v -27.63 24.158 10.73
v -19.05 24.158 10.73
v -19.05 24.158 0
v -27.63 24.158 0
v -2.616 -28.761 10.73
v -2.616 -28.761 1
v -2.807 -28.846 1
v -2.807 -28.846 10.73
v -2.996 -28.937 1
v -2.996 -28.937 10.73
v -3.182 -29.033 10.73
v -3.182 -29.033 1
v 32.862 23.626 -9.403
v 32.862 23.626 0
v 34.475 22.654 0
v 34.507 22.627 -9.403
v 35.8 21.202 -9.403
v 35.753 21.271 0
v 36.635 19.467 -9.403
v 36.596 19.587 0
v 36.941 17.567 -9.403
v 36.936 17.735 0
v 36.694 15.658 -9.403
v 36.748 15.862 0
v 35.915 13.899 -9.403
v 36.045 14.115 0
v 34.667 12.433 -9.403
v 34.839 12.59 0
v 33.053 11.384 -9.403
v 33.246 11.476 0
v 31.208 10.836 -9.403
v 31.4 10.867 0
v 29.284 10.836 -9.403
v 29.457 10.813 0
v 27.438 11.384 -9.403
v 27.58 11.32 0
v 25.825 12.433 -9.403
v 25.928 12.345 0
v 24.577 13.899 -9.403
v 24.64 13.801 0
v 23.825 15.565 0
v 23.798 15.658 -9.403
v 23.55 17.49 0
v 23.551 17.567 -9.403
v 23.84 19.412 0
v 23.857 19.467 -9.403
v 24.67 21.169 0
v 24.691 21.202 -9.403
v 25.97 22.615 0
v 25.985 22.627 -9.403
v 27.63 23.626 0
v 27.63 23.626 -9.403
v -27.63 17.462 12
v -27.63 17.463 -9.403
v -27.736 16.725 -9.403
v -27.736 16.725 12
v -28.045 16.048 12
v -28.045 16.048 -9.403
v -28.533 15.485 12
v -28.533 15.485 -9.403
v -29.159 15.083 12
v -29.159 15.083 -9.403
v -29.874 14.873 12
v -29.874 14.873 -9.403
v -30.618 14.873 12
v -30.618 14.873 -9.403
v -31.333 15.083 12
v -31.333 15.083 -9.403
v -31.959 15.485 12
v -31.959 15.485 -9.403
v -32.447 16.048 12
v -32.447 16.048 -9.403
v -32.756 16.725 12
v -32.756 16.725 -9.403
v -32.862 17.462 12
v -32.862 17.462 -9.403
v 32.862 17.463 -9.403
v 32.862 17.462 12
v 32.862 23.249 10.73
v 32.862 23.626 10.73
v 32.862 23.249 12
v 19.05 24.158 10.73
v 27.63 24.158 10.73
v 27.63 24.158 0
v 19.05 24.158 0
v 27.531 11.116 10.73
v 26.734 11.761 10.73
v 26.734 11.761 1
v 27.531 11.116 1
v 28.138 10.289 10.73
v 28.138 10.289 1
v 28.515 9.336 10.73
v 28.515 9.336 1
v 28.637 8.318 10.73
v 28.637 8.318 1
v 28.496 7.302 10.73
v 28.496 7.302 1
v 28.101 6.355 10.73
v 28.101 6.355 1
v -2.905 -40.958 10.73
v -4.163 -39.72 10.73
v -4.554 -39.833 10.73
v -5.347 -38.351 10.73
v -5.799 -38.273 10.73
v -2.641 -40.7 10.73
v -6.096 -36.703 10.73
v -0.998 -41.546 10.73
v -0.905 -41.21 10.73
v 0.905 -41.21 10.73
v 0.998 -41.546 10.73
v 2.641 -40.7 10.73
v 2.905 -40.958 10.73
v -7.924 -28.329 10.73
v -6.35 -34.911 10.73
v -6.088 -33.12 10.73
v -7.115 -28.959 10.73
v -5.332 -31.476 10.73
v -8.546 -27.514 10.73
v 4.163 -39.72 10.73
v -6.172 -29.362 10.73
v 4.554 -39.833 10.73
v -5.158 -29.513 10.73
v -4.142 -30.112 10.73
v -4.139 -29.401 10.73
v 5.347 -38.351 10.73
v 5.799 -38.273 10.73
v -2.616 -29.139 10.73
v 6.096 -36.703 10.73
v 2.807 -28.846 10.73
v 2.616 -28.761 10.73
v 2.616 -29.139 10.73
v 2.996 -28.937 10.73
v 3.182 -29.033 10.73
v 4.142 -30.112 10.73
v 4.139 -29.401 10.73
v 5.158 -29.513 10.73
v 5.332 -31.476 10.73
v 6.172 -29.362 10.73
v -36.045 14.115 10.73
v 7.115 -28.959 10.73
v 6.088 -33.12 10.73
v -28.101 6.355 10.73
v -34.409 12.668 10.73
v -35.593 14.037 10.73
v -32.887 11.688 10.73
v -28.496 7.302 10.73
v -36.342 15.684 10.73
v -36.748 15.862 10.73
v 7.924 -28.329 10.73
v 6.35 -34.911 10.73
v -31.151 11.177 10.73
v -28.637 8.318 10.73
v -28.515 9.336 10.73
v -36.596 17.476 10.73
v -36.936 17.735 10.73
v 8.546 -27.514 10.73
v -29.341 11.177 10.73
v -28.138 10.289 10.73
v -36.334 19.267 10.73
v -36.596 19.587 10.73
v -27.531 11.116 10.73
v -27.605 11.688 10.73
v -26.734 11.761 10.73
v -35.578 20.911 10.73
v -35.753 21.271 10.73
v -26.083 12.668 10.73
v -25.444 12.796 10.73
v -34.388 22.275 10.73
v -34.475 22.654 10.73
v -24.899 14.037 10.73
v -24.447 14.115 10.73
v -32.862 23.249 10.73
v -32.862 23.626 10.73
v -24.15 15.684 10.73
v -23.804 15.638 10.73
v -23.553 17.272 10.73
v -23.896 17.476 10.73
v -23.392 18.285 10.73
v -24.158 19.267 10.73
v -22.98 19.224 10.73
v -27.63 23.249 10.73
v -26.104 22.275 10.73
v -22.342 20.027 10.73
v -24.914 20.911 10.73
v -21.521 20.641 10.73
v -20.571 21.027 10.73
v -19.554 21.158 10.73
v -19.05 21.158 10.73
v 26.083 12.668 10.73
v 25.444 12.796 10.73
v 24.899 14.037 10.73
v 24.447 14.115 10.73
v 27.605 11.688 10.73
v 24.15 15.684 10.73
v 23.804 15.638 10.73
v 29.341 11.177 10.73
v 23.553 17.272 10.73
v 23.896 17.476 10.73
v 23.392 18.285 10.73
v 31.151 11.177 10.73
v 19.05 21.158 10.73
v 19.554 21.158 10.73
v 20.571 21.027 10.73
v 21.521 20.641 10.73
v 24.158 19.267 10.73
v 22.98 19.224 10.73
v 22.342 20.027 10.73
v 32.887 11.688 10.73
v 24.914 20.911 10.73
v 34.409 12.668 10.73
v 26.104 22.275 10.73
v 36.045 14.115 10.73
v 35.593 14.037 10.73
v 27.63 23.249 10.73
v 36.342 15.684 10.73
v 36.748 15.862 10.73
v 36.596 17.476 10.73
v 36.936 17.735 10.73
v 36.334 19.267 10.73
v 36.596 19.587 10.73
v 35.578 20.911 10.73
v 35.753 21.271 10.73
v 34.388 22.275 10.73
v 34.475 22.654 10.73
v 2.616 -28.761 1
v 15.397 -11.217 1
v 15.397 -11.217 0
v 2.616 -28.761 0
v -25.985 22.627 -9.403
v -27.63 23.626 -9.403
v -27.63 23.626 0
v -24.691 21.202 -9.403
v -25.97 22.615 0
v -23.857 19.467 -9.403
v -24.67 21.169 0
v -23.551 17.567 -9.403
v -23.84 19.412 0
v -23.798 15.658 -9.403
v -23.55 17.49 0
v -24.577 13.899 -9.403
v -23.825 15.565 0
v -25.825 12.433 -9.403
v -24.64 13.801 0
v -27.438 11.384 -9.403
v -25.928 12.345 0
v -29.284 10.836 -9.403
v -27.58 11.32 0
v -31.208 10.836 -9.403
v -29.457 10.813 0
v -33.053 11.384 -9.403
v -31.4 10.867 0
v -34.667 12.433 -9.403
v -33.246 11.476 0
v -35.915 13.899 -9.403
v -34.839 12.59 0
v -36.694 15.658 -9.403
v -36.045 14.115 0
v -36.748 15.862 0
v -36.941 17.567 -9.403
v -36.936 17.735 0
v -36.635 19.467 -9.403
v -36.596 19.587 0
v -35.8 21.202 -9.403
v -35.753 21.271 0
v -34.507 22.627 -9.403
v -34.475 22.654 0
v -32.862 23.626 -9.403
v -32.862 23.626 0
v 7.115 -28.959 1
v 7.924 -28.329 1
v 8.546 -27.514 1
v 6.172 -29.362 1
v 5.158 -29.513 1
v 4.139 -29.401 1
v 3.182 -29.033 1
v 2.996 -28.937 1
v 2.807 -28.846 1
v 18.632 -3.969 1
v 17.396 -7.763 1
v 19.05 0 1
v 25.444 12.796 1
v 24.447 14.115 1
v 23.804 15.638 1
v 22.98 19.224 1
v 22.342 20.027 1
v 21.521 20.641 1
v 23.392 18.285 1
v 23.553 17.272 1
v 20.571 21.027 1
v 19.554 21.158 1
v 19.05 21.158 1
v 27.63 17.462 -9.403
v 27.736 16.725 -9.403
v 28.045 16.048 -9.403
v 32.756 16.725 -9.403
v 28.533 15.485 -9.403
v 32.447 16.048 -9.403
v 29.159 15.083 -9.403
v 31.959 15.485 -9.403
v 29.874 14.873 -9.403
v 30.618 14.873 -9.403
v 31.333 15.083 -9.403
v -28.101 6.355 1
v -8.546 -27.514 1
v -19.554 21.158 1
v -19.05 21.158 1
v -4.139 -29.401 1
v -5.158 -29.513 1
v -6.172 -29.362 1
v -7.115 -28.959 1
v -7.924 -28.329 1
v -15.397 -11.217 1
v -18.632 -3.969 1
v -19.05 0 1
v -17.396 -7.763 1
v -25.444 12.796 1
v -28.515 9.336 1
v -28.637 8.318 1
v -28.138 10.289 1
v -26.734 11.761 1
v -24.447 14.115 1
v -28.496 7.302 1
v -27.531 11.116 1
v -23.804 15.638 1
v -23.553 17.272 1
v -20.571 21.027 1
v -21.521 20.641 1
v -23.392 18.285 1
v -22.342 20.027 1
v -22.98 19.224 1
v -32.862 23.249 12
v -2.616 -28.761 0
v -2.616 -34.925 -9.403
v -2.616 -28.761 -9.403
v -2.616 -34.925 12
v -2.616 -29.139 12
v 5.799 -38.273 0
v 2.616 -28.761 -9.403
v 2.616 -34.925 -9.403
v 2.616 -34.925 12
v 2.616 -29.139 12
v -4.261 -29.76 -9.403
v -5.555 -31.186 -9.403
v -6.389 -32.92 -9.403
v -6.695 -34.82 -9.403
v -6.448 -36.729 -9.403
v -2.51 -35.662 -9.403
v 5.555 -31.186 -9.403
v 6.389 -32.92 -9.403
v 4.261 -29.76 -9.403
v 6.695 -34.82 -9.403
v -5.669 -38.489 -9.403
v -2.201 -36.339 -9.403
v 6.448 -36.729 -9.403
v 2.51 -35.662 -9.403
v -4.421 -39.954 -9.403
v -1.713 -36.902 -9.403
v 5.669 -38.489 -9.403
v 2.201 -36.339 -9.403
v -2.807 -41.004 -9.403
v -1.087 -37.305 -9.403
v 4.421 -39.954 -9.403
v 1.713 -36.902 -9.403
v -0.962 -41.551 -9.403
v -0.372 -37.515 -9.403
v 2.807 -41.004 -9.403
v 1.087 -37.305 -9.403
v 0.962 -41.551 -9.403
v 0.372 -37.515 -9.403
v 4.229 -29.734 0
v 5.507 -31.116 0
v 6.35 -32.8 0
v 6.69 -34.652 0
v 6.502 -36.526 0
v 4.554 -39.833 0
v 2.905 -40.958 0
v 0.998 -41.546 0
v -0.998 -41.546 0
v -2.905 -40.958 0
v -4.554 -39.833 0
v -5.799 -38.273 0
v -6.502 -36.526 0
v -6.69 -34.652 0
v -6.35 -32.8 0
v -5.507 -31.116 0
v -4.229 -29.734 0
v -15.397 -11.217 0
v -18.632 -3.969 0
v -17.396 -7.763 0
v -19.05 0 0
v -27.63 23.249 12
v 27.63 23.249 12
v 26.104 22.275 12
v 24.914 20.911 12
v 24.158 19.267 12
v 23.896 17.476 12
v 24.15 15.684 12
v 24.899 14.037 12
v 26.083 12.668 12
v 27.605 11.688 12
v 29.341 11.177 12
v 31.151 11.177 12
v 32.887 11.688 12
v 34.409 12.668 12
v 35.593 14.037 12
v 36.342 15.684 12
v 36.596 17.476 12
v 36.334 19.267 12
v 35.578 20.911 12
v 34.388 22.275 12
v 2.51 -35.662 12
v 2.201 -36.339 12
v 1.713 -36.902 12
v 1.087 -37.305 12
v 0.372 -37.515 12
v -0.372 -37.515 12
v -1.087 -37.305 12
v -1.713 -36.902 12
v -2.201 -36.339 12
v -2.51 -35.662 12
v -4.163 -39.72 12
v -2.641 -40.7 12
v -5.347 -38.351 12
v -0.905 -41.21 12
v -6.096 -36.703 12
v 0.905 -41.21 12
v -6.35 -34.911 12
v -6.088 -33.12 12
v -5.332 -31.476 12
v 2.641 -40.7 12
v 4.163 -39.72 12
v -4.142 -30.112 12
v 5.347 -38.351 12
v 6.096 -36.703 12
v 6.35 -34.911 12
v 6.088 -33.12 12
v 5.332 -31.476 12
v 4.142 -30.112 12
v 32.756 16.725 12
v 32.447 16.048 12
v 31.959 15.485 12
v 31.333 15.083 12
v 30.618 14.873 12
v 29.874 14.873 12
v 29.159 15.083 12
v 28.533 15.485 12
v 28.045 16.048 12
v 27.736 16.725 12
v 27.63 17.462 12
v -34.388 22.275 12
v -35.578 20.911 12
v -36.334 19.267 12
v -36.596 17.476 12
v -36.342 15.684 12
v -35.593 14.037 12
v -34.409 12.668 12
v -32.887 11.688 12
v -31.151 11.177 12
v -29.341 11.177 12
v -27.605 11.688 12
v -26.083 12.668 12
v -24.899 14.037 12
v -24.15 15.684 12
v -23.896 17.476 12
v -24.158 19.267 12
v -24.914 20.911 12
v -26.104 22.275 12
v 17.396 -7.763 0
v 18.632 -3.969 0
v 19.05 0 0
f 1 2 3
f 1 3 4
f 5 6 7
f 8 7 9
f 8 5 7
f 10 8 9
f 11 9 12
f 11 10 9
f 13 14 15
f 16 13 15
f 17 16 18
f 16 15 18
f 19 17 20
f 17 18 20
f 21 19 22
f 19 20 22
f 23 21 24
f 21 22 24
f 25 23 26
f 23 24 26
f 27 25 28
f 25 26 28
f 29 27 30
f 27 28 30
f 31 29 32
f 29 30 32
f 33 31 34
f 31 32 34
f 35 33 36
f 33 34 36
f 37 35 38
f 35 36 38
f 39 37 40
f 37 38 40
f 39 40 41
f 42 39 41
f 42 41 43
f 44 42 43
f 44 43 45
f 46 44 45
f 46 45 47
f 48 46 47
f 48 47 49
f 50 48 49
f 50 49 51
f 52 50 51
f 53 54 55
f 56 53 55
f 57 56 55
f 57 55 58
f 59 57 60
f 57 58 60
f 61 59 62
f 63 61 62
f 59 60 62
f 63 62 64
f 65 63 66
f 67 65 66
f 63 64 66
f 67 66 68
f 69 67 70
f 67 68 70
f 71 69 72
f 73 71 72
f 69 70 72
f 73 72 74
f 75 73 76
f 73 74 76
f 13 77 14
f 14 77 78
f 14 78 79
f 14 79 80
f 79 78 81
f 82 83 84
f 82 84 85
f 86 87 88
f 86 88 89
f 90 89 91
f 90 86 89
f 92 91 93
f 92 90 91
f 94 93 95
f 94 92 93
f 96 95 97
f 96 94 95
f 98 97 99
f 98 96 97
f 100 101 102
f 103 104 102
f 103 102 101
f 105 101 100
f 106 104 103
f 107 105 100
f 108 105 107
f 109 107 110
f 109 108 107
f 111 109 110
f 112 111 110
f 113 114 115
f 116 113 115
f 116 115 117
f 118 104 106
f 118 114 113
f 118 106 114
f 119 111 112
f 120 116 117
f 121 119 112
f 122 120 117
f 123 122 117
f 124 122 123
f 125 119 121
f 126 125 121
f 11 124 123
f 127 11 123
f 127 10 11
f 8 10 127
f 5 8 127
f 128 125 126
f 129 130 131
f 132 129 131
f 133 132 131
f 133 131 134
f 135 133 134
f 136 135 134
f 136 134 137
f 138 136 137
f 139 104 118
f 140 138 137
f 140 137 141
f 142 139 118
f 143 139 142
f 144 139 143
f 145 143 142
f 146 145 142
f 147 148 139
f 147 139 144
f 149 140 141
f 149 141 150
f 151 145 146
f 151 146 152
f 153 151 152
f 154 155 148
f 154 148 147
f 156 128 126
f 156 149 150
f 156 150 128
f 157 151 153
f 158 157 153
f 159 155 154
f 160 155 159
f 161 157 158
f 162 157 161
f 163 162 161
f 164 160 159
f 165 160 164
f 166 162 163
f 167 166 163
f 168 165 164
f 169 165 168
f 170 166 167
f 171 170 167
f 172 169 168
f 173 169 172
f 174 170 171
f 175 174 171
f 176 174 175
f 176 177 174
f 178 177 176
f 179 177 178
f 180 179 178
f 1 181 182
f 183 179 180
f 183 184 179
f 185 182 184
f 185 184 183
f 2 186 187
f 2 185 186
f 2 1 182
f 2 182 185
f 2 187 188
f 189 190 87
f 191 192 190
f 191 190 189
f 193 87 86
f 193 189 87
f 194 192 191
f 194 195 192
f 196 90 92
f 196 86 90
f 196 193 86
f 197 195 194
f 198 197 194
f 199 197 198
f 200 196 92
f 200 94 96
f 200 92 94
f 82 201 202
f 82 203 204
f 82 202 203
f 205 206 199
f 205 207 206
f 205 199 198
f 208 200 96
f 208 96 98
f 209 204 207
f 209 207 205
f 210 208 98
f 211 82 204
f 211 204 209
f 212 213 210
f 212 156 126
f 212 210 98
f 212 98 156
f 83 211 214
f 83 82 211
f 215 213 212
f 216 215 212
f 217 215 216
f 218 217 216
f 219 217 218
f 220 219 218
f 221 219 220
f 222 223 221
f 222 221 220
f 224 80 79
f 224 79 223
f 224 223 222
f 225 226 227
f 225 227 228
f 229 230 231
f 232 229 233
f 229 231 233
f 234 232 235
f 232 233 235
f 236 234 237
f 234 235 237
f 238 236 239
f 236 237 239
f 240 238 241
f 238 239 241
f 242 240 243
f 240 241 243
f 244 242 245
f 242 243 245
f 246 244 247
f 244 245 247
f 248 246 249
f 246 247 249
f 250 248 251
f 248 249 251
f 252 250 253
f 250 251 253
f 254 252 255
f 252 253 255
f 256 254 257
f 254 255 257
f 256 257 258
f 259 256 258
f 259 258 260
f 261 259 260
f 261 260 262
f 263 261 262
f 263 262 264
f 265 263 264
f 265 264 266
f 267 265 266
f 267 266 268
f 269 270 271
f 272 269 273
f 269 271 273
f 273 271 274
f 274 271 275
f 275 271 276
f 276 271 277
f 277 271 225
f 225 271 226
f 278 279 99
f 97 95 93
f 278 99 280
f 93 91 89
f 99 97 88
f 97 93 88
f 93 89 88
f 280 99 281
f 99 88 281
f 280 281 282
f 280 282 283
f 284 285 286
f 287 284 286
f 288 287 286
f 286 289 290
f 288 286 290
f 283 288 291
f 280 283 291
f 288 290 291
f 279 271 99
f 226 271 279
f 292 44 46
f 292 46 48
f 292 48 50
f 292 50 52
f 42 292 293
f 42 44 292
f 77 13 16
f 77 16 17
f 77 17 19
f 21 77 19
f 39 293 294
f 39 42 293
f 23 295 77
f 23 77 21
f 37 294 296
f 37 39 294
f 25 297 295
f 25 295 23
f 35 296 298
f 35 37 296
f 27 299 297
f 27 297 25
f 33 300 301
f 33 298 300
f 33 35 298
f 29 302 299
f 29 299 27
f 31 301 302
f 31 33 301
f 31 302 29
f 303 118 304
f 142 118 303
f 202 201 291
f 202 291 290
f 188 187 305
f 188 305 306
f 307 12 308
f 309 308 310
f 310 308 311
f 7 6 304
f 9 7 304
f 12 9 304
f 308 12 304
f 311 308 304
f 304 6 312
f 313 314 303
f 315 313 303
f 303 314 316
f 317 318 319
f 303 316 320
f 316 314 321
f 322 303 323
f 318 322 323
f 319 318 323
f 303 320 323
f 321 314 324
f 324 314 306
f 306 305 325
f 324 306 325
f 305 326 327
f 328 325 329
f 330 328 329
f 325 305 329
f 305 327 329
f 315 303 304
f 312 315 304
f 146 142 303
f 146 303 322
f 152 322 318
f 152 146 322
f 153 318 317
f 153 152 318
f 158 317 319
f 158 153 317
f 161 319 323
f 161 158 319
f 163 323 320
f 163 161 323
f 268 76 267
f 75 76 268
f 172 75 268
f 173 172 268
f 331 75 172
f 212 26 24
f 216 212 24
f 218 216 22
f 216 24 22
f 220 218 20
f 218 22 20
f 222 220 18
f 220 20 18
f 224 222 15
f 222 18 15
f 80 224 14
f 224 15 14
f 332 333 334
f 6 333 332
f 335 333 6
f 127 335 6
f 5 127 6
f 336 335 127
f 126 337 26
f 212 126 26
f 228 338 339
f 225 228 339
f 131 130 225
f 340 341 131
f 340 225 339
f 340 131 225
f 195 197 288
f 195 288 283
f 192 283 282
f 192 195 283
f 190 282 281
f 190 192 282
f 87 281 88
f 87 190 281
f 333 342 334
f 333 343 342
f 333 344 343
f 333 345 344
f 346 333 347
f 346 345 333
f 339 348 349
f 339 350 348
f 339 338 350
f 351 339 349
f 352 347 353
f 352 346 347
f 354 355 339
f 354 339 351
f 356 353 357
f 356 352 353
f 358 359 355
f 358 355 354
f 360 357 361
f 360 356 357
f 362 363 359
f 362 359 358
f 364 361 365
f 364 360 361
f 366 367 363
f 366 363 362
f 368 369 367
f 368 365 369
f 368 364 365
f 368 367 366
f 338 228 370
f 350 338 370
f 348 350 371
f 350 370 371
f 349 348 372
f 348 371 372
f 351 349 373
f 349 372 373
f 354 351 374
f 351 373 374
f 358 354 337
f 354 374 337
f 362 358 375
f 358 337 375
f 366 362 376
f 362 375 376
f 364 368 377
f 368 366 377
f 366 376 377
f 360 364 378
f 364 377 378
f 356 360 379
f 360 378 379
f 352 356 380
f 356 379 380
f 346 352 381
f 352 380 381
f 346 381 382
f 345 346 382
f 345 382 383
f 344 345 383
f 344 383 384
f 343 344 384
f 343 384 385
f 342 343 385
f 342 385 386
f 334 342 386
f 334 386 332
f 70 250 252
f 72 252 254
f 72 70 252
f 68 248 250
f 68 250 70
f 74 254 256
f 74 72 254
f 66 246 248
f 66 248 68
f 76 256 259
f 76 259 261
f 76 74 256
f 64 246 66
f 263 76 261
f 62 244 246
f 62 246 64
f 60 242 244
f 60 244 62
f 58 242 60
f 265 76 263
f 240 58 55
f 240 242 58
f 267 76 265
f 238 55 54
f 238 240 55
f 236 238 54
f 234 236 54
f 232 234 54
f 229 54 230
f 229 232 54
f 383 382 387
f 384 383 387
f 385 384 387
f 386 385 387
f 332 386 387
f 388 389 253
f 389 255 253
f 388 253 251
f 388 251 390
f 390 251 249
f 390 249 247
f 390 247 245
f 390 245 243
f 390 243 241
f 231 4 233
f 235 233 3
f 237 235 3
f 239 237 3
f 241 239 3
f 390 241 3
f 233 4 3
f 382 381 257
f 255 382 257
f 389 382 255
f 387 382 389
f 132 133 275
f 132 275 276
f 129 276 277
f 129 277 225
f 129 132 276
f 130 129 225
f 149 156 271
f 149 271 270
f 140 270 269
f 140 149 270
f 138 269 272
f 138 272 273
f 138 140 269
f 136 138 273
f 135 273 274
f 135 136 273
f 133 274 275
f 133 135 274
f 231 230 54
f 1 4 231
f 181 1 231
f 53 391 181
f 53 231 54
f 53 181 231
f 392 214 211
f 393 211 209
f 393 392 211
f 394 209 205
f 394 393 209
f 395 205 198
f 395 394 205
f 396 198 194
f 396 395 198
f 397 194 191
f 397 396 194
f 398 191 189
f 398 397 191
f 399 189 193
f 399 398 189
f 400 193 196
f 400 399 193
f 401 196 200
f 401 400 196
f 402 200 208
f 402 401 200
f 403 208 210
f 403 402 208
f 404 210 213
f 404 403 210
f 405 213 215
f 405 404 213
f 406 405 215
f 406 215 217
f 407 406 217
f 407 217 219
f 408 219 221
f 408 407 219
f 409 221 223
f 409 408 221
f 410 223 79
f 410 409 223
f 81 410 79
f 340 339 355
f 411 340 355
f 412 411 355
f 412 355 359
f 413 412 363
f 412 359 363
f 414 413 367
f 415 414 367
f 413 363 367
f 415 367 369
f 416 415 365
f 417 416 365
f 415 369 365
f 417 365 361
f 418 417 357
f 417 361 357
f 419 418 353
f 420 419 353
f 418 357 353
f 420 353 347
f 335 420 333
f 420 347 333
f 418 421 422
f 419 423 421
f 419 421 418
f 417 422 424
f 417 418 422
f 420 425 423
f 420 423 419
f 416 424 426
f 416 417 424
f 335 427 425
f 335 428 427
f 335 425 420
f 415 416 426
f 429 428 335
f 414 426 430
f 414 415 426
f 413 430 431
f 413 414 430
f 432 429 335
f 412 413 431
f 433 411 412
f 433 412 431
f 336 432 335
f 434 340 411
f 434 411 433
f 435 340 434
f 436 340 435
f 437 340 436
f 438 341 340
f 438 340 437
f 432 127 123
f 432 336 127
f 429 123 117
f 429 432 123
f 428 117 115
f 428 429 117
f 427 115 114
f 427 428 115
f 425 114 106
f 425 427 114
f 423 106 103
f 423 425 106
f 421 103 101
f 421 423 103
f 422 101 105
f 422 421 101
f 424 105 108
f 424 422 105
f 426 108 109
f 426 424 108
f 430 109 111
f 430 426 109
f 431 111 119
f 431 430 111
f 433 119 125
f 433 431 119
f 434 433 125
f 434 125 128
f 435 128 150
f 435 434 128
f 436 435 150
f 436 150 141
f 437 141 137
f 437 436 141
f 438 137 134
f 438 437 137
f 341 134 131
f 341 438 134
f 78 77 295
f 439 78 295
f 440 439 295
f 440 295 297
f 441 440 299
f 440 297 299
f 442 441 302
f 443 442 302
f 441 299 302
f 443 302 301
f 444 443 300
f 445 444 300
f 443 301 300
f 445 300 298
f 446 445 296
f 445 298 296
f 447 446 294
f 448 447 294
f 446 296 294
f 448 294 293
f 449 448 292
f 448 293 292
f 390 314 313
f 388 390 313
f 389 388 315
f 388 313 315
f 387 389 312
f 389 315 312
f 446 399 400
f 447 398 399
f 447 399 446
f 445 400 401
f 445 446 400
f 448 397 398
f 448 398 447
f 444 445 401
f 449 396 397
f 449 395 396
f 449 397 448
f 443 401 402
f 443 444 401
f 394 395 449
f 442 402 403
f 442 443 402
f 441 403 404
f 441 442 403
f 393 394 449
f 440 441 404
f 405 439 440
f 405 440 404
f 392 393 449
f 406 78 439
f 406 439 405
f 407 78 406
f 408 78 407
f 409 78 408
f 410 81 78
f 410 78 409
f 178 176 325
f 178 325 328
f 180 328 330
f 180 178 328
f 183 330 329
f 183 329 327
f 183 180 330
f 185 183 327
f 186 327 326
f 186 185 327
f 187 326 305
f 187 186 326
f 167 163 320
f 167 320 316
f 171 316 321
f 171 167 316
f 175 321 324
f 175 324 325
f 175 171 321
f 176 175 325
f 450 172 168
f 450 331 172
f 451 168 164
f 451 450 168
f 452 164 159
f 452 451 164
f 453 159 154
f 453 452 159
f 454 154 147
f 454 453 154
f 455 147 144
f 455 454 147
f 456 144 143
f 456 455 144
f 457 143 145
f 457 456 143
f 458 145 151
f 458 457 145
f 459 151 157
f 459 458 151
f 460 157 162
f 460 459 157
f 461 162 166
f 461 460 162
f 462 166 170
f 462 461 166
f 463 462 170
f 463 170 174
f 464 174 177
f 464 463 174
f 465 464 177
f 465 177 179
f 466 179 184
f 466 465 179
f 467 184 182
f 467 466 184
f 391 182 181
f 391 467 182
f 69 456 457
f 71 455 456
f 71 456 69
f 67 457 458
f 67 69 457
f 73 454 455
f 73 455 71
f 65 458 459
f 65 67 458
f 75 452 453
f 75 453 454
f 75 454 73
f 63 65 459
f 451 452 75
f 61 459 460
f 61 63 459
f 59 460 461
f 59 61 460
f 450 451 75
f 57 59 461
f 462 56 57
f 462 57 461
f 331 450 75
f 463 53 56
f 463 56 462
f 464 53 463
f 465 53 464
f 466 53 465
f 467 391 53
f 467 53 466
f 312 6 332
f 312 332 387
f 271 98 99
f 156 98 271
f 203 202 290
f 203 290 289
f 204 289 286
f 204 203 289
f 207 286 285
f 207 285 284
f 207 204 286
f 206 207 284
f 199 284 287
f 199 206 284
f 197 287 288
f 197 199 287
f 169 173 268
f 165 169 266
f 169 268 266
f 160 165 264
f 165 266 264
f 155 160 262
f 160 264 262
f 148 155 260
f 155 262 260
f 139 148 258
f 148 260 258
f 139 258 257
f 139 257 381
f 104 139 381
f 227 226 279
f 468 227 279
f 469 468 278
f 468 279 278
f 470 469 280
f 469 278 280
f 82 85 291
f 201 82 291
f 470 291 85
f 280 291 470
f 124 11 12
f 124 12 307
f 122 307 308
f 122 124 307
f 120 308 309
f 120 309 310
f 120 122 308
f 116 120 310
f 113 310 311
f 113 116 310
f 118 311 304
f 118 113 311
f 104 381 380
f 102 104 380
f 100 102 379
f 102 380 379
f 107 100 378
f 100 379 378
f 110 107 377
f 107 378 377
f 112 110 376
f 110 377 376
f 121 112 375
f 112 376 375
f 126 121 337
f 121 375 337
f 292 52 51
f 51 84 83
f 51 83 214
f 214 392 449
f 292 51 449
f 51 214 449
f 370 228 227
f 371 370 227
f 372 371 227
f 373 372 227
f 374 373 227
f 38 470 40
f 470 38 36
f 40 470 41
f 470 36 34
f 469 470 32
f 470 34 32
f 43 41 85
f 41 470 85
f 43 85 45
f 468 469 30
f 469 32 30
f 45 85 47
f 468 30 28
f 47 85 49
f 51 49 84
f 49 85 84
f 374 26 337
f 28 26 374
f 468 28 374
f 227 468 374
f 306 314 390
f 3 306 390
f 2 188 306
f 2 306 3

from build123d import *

# Parameters (mm, degrees)
SKETCH1_R           = 1.5
BOSS_EXTRUDE1_DEPTH = 12
SKETCH2_R           = 6.695859604
BOSS_EXTRUDE2_DEPTH = 9.4028
CUT_EXTRUDE2_DEPTH  = 64.105652153
HOLE1_D             = 5.2324
CUT_EXTRUDE3_DEPTH  = 11
SKETCH8_R           = 19.05
CUT_EXTRUDE4_DEPTH  = 10
SKETCH9_R           = 6.35
CUT_EXTRUDE6_DEPTH  = 1.27
CUT_EXTRUDE7_DEPTH  = 60.624425826


with BuildPart() as part:
    # Sketch1 → Boss-Extrude1 (new body)
    with BuildSketch(Plane.XY):
        Polygon((-40.843506262, 22.426308796), (-1, -46.5846684), (1, -46.5846684), (40.843506262, 22.426308796), (39.843506262, 24.158359604), (-39.843506262, 24.158359604), align=None)
        with Locations((-30.245937227, 17.4625)):
            Circle(SKETCH1_R, mode=Mode.SUBTRACT)
        with Locations((30.245937227, 17.4625)):
            Circle(SKETCH1_R, mode=Mode.SUBTRACT)
        with Locations((0, -34.925)):
            Circle(SKETCH1_R, mode=Mode.SUBTRACT)
    extrude(amount=BOSS_EXTRUDE1_DEPTH)

    # Sketch2 → Boss-Extrude2 (add)
    with BuildSketch(Plane(origin=(0, 0, 0), x_dir=(-1, 0, 0), z_dir=(0, 0, -1))):
        with Locations(Location((30.245937227, 17.4625, 0), (0, 0, 90))):
            Circle(SKETCH2_R)
        with Locations(Location((-30.245937227, 17.4625, 0), (0, 0, 210))):
            Circle(SKETCH2_R)
        with Locations(Location((0, -34.925, 0), (0, 0, 210))):
            Circle(SKETCH2_R)
    extrude(amount=BOSS_EXTRUDE2_DEPTH)

    # Sketch3 → Cut-Extrude2 (cut, through all)
    with BuildSketch(Plane(origin=(0, 0, 0), x_dir=(-1, 0, 0), z_dir=(0, 0, -1))):
        with BuildLine():
            Line((-5.798784517, -38.272929802), (-1, -46.5846684))
            Line((-1, -46.5846684), (1, -46.5846684))
            Line((1, -46.5846684), (5.798784517, -38.272929802))
            ThreePointArc((5.798784517, -38.272929802), (0, -41.620859604), (-5.798784517, -38.272929802))
        make_face()
        with BuildLine():
            Line((-30.245937227, 24.158359604), (-39.843506262, 24.158359604))
            Line((-39.843506262, 24.158359604), (-40.843506262, 22.426308796))
            Line((-40.843506262, 22.426308796), (-36.044721744, 14.114570198))
            ThreePointArc((-36.044721744, 14.114570198), (-36.044721744, 20.810429802), (-30.245937227, 24.158359604))
        make_face()
        with BuildLine():
            Line((36.044721744, 14.114570198), (40.843506262, 22.426308796))
            Line((40.843506262, 22.426308796), (39.843506262, 24.158359604))
            Line((39.843506262, 24.158359604), (30.245937227, 24.158359604))
            ThreePointArc((30.245937227, 24.158359604), (36.044721744, 20.810429802), (36.044721744, 14.114570198))
        make_face()
    extrude(amount=-CUT_EXTRUDE2_DEPTH, mode=Mode.SUBTRACT)

    # Hole1 (through all)
    with Locations(Plane.XY.offset(12)):
        with Locations((-30.245937227, 17.4625), (30.245937227, 17.4625), (0, -34.925)):
            Hole(HOLE1_D / 2)

    # Sketch7 → Cut-Extrude3 (cut)
    with BuildSketch(Plane.XY.offset(12)):
        with BuildLine():
            Line((-19.554402665, 21.158359604), (19.554402665, 21.158359604))
            ThreePointArc((19.554402665, 21.158359604), (22.342326137, 20.026718493), (23.552785201, 17.272100961))
            ThreePointArc((23.552785201, 17.272100961), (24.44715271, 14.114570198), (26.734470809, 11.761259834))
            ThreePointArc((26.734470809, 11.761259834), (28.514810038, 9.335662768), (28.100878252, 6.355429662))
            Line((28.100878252, 6.355429662), (8.546475587, -27.513789266))
            ThreePointArc((8.546475587, -27.513789266), (6.1724839, -29.362381261), (3.181685608, -29.033360795))
            ThreePointArc((3.181685608, -29.033360795), (0, -28.229140396), (-3.181685608, -29.033360795))
            ThreePointArc((-3.181685608, -29.033360795), (-6.1724839, -29.362381261), (-8.546475587, -27.513789266))
            Line((-8.546475587, -27.513789266), (-28.100878252, 6.355429662))
            ThreePointArc((-28.100878252, 6.355429662), (-28.514810038, 9.335662768), (-26.734470809, 11.761259834))
            ThreePointArc((-26.734470809, 11.761259834), (-24.44715271, 14.114570198), (-23.552785201, 17.272100961))
            ThreePointArc((-23.552785201, 17.272100961), (-22.342326137, 20.026718493), (-19.554402665, 21.158359604))
        make_face()
    extrude(amount=-CUT_EXTRUDE3_DEPTH, mode=Mode.SUBTRACT)

    # Sketch8 → Cut-Extrude4 (cut)
    with BuildSketch(Plane.XY.offset(1)):
        Circle(SKETCH8_R)
    extrude(amount=-CUT_EXTRUDE4_DEPTH, mode=Mode.SUBTRACT)

    # Sketch9 → Cut-Extrude6 (cut)
    with BuildSketch(Plane.XY.offset(12)):
        with BuildLine():
            Line((5.798784517, -38.272929802), (36.044721744, 14.114570198))
            ThreePointArc((36.044721744, 14.114570198), (36.044721744, 20.810429802), (30.245937227, 24.158359604))
            Line((30.245937227, 24.158359604), (-30.245937227, 24.158359604))
            ThreePointArc((-30.245937227, 24.158359604), (-36.044721744, 20.810429802), (-36.044721744, 14.114570198))
            Line((-36.044721744, 14.114570198), (-5.798784517, -38.272929802))
            ThreePointArc((-5.798784517, -38.272929802), (0, -41.620859604), (5.798784517, -38.272929802))
        make_face()
        with Locations((-30.245937227, 17.4625)):
            Circle(SKETCH9_R, mode=Mode.SUBTRACT)
        with Locations((30.245937227, 17.4625)):
            Circle(SKETCH9_R, mode=Mode.SUBTRACT)
        with Locations((0, -34.925)):
            Circle(SKETCH9_R, mode=Mode.SUBTRACT)
    extrude(amount=-CUT_EXTRUDE6_DEPTH, mode=Mode.SUBTRACT)

    # Sketch10 → Cut-Extrude7 (cut, through all)
    with BuildSketch(Plane.XY.offset(12)):
        with BuildLine():
            Line((-32.862137227, 17.4625), (-32.862137227, 23.626105552))
            ThreePointArc((-32.862137227, 23.626105552), (-31.580833929, 24.023946992), (-30.245937227, 24.158359604))
            Line((-30.245937227, 24.158359604), (-27.629737227, 24.158359604))
            Line((-27.629737227, 24.158359604), (-27.629737227, 17.4625))
            ThreePointArc((-27.629737227, 17.4625), (-30.245937227, 14.8463), (-32.862137227, 17.4625))
        make_face()
        with BuildLine():
            Line((30.245937227, 24.158359604), (27.629737227, 24.158359604))
            Line((27.629737227, 24.158359604), (27.629737227, 17.4625))
            ThreePointArc((27.629737227, 17.4625), (30.245937227, 14.8463), (32.862137227, 17.4625))
            Line((32.862137227, 17.4625), (32.862137227, 23.626105552))
            ThreePointArc((32.862137227, 23.626105552), (31.580833929, 24.023946992), (30.245937227, 24.158359604))
        make_face()
        with BuildLine():
            Line((-19.05, 0), (-19.05, 24.158359604))
            Line((-19.05, 24.158359604), (19.05, 24.158359604))
            Line((19.05, 24.158359604), (19.05, 0))
            ThreePointArc((19.05, 0), (18.113838196, -5.898420621), (15.397363169, -11.217116717))
            Line((15.397363169, -11.217116717), (2.6162, -28.761394448))
            Line((2.6162, -28.761394448), (2.6162, -34.925))
            ThreePointArc((2.6162, -34.925), (0, -37.5412), (-2.6162, -34.925))
            Line((-2.6162, -34.925), (-2.6162, -28.761394448))
            Line((-2.6162, -28.761394448), (-15.397363169, -11.217116717))
            ThreePointArc((-15.397363169, -11.217116717), (-18.113838196, -5.898420621), (-19.05, 0))
        make_face()
    extrude(amount=-CUT_EXTRUDE7_DEPTH, mode=Mode.SUBTRACT)


solid = part.part
